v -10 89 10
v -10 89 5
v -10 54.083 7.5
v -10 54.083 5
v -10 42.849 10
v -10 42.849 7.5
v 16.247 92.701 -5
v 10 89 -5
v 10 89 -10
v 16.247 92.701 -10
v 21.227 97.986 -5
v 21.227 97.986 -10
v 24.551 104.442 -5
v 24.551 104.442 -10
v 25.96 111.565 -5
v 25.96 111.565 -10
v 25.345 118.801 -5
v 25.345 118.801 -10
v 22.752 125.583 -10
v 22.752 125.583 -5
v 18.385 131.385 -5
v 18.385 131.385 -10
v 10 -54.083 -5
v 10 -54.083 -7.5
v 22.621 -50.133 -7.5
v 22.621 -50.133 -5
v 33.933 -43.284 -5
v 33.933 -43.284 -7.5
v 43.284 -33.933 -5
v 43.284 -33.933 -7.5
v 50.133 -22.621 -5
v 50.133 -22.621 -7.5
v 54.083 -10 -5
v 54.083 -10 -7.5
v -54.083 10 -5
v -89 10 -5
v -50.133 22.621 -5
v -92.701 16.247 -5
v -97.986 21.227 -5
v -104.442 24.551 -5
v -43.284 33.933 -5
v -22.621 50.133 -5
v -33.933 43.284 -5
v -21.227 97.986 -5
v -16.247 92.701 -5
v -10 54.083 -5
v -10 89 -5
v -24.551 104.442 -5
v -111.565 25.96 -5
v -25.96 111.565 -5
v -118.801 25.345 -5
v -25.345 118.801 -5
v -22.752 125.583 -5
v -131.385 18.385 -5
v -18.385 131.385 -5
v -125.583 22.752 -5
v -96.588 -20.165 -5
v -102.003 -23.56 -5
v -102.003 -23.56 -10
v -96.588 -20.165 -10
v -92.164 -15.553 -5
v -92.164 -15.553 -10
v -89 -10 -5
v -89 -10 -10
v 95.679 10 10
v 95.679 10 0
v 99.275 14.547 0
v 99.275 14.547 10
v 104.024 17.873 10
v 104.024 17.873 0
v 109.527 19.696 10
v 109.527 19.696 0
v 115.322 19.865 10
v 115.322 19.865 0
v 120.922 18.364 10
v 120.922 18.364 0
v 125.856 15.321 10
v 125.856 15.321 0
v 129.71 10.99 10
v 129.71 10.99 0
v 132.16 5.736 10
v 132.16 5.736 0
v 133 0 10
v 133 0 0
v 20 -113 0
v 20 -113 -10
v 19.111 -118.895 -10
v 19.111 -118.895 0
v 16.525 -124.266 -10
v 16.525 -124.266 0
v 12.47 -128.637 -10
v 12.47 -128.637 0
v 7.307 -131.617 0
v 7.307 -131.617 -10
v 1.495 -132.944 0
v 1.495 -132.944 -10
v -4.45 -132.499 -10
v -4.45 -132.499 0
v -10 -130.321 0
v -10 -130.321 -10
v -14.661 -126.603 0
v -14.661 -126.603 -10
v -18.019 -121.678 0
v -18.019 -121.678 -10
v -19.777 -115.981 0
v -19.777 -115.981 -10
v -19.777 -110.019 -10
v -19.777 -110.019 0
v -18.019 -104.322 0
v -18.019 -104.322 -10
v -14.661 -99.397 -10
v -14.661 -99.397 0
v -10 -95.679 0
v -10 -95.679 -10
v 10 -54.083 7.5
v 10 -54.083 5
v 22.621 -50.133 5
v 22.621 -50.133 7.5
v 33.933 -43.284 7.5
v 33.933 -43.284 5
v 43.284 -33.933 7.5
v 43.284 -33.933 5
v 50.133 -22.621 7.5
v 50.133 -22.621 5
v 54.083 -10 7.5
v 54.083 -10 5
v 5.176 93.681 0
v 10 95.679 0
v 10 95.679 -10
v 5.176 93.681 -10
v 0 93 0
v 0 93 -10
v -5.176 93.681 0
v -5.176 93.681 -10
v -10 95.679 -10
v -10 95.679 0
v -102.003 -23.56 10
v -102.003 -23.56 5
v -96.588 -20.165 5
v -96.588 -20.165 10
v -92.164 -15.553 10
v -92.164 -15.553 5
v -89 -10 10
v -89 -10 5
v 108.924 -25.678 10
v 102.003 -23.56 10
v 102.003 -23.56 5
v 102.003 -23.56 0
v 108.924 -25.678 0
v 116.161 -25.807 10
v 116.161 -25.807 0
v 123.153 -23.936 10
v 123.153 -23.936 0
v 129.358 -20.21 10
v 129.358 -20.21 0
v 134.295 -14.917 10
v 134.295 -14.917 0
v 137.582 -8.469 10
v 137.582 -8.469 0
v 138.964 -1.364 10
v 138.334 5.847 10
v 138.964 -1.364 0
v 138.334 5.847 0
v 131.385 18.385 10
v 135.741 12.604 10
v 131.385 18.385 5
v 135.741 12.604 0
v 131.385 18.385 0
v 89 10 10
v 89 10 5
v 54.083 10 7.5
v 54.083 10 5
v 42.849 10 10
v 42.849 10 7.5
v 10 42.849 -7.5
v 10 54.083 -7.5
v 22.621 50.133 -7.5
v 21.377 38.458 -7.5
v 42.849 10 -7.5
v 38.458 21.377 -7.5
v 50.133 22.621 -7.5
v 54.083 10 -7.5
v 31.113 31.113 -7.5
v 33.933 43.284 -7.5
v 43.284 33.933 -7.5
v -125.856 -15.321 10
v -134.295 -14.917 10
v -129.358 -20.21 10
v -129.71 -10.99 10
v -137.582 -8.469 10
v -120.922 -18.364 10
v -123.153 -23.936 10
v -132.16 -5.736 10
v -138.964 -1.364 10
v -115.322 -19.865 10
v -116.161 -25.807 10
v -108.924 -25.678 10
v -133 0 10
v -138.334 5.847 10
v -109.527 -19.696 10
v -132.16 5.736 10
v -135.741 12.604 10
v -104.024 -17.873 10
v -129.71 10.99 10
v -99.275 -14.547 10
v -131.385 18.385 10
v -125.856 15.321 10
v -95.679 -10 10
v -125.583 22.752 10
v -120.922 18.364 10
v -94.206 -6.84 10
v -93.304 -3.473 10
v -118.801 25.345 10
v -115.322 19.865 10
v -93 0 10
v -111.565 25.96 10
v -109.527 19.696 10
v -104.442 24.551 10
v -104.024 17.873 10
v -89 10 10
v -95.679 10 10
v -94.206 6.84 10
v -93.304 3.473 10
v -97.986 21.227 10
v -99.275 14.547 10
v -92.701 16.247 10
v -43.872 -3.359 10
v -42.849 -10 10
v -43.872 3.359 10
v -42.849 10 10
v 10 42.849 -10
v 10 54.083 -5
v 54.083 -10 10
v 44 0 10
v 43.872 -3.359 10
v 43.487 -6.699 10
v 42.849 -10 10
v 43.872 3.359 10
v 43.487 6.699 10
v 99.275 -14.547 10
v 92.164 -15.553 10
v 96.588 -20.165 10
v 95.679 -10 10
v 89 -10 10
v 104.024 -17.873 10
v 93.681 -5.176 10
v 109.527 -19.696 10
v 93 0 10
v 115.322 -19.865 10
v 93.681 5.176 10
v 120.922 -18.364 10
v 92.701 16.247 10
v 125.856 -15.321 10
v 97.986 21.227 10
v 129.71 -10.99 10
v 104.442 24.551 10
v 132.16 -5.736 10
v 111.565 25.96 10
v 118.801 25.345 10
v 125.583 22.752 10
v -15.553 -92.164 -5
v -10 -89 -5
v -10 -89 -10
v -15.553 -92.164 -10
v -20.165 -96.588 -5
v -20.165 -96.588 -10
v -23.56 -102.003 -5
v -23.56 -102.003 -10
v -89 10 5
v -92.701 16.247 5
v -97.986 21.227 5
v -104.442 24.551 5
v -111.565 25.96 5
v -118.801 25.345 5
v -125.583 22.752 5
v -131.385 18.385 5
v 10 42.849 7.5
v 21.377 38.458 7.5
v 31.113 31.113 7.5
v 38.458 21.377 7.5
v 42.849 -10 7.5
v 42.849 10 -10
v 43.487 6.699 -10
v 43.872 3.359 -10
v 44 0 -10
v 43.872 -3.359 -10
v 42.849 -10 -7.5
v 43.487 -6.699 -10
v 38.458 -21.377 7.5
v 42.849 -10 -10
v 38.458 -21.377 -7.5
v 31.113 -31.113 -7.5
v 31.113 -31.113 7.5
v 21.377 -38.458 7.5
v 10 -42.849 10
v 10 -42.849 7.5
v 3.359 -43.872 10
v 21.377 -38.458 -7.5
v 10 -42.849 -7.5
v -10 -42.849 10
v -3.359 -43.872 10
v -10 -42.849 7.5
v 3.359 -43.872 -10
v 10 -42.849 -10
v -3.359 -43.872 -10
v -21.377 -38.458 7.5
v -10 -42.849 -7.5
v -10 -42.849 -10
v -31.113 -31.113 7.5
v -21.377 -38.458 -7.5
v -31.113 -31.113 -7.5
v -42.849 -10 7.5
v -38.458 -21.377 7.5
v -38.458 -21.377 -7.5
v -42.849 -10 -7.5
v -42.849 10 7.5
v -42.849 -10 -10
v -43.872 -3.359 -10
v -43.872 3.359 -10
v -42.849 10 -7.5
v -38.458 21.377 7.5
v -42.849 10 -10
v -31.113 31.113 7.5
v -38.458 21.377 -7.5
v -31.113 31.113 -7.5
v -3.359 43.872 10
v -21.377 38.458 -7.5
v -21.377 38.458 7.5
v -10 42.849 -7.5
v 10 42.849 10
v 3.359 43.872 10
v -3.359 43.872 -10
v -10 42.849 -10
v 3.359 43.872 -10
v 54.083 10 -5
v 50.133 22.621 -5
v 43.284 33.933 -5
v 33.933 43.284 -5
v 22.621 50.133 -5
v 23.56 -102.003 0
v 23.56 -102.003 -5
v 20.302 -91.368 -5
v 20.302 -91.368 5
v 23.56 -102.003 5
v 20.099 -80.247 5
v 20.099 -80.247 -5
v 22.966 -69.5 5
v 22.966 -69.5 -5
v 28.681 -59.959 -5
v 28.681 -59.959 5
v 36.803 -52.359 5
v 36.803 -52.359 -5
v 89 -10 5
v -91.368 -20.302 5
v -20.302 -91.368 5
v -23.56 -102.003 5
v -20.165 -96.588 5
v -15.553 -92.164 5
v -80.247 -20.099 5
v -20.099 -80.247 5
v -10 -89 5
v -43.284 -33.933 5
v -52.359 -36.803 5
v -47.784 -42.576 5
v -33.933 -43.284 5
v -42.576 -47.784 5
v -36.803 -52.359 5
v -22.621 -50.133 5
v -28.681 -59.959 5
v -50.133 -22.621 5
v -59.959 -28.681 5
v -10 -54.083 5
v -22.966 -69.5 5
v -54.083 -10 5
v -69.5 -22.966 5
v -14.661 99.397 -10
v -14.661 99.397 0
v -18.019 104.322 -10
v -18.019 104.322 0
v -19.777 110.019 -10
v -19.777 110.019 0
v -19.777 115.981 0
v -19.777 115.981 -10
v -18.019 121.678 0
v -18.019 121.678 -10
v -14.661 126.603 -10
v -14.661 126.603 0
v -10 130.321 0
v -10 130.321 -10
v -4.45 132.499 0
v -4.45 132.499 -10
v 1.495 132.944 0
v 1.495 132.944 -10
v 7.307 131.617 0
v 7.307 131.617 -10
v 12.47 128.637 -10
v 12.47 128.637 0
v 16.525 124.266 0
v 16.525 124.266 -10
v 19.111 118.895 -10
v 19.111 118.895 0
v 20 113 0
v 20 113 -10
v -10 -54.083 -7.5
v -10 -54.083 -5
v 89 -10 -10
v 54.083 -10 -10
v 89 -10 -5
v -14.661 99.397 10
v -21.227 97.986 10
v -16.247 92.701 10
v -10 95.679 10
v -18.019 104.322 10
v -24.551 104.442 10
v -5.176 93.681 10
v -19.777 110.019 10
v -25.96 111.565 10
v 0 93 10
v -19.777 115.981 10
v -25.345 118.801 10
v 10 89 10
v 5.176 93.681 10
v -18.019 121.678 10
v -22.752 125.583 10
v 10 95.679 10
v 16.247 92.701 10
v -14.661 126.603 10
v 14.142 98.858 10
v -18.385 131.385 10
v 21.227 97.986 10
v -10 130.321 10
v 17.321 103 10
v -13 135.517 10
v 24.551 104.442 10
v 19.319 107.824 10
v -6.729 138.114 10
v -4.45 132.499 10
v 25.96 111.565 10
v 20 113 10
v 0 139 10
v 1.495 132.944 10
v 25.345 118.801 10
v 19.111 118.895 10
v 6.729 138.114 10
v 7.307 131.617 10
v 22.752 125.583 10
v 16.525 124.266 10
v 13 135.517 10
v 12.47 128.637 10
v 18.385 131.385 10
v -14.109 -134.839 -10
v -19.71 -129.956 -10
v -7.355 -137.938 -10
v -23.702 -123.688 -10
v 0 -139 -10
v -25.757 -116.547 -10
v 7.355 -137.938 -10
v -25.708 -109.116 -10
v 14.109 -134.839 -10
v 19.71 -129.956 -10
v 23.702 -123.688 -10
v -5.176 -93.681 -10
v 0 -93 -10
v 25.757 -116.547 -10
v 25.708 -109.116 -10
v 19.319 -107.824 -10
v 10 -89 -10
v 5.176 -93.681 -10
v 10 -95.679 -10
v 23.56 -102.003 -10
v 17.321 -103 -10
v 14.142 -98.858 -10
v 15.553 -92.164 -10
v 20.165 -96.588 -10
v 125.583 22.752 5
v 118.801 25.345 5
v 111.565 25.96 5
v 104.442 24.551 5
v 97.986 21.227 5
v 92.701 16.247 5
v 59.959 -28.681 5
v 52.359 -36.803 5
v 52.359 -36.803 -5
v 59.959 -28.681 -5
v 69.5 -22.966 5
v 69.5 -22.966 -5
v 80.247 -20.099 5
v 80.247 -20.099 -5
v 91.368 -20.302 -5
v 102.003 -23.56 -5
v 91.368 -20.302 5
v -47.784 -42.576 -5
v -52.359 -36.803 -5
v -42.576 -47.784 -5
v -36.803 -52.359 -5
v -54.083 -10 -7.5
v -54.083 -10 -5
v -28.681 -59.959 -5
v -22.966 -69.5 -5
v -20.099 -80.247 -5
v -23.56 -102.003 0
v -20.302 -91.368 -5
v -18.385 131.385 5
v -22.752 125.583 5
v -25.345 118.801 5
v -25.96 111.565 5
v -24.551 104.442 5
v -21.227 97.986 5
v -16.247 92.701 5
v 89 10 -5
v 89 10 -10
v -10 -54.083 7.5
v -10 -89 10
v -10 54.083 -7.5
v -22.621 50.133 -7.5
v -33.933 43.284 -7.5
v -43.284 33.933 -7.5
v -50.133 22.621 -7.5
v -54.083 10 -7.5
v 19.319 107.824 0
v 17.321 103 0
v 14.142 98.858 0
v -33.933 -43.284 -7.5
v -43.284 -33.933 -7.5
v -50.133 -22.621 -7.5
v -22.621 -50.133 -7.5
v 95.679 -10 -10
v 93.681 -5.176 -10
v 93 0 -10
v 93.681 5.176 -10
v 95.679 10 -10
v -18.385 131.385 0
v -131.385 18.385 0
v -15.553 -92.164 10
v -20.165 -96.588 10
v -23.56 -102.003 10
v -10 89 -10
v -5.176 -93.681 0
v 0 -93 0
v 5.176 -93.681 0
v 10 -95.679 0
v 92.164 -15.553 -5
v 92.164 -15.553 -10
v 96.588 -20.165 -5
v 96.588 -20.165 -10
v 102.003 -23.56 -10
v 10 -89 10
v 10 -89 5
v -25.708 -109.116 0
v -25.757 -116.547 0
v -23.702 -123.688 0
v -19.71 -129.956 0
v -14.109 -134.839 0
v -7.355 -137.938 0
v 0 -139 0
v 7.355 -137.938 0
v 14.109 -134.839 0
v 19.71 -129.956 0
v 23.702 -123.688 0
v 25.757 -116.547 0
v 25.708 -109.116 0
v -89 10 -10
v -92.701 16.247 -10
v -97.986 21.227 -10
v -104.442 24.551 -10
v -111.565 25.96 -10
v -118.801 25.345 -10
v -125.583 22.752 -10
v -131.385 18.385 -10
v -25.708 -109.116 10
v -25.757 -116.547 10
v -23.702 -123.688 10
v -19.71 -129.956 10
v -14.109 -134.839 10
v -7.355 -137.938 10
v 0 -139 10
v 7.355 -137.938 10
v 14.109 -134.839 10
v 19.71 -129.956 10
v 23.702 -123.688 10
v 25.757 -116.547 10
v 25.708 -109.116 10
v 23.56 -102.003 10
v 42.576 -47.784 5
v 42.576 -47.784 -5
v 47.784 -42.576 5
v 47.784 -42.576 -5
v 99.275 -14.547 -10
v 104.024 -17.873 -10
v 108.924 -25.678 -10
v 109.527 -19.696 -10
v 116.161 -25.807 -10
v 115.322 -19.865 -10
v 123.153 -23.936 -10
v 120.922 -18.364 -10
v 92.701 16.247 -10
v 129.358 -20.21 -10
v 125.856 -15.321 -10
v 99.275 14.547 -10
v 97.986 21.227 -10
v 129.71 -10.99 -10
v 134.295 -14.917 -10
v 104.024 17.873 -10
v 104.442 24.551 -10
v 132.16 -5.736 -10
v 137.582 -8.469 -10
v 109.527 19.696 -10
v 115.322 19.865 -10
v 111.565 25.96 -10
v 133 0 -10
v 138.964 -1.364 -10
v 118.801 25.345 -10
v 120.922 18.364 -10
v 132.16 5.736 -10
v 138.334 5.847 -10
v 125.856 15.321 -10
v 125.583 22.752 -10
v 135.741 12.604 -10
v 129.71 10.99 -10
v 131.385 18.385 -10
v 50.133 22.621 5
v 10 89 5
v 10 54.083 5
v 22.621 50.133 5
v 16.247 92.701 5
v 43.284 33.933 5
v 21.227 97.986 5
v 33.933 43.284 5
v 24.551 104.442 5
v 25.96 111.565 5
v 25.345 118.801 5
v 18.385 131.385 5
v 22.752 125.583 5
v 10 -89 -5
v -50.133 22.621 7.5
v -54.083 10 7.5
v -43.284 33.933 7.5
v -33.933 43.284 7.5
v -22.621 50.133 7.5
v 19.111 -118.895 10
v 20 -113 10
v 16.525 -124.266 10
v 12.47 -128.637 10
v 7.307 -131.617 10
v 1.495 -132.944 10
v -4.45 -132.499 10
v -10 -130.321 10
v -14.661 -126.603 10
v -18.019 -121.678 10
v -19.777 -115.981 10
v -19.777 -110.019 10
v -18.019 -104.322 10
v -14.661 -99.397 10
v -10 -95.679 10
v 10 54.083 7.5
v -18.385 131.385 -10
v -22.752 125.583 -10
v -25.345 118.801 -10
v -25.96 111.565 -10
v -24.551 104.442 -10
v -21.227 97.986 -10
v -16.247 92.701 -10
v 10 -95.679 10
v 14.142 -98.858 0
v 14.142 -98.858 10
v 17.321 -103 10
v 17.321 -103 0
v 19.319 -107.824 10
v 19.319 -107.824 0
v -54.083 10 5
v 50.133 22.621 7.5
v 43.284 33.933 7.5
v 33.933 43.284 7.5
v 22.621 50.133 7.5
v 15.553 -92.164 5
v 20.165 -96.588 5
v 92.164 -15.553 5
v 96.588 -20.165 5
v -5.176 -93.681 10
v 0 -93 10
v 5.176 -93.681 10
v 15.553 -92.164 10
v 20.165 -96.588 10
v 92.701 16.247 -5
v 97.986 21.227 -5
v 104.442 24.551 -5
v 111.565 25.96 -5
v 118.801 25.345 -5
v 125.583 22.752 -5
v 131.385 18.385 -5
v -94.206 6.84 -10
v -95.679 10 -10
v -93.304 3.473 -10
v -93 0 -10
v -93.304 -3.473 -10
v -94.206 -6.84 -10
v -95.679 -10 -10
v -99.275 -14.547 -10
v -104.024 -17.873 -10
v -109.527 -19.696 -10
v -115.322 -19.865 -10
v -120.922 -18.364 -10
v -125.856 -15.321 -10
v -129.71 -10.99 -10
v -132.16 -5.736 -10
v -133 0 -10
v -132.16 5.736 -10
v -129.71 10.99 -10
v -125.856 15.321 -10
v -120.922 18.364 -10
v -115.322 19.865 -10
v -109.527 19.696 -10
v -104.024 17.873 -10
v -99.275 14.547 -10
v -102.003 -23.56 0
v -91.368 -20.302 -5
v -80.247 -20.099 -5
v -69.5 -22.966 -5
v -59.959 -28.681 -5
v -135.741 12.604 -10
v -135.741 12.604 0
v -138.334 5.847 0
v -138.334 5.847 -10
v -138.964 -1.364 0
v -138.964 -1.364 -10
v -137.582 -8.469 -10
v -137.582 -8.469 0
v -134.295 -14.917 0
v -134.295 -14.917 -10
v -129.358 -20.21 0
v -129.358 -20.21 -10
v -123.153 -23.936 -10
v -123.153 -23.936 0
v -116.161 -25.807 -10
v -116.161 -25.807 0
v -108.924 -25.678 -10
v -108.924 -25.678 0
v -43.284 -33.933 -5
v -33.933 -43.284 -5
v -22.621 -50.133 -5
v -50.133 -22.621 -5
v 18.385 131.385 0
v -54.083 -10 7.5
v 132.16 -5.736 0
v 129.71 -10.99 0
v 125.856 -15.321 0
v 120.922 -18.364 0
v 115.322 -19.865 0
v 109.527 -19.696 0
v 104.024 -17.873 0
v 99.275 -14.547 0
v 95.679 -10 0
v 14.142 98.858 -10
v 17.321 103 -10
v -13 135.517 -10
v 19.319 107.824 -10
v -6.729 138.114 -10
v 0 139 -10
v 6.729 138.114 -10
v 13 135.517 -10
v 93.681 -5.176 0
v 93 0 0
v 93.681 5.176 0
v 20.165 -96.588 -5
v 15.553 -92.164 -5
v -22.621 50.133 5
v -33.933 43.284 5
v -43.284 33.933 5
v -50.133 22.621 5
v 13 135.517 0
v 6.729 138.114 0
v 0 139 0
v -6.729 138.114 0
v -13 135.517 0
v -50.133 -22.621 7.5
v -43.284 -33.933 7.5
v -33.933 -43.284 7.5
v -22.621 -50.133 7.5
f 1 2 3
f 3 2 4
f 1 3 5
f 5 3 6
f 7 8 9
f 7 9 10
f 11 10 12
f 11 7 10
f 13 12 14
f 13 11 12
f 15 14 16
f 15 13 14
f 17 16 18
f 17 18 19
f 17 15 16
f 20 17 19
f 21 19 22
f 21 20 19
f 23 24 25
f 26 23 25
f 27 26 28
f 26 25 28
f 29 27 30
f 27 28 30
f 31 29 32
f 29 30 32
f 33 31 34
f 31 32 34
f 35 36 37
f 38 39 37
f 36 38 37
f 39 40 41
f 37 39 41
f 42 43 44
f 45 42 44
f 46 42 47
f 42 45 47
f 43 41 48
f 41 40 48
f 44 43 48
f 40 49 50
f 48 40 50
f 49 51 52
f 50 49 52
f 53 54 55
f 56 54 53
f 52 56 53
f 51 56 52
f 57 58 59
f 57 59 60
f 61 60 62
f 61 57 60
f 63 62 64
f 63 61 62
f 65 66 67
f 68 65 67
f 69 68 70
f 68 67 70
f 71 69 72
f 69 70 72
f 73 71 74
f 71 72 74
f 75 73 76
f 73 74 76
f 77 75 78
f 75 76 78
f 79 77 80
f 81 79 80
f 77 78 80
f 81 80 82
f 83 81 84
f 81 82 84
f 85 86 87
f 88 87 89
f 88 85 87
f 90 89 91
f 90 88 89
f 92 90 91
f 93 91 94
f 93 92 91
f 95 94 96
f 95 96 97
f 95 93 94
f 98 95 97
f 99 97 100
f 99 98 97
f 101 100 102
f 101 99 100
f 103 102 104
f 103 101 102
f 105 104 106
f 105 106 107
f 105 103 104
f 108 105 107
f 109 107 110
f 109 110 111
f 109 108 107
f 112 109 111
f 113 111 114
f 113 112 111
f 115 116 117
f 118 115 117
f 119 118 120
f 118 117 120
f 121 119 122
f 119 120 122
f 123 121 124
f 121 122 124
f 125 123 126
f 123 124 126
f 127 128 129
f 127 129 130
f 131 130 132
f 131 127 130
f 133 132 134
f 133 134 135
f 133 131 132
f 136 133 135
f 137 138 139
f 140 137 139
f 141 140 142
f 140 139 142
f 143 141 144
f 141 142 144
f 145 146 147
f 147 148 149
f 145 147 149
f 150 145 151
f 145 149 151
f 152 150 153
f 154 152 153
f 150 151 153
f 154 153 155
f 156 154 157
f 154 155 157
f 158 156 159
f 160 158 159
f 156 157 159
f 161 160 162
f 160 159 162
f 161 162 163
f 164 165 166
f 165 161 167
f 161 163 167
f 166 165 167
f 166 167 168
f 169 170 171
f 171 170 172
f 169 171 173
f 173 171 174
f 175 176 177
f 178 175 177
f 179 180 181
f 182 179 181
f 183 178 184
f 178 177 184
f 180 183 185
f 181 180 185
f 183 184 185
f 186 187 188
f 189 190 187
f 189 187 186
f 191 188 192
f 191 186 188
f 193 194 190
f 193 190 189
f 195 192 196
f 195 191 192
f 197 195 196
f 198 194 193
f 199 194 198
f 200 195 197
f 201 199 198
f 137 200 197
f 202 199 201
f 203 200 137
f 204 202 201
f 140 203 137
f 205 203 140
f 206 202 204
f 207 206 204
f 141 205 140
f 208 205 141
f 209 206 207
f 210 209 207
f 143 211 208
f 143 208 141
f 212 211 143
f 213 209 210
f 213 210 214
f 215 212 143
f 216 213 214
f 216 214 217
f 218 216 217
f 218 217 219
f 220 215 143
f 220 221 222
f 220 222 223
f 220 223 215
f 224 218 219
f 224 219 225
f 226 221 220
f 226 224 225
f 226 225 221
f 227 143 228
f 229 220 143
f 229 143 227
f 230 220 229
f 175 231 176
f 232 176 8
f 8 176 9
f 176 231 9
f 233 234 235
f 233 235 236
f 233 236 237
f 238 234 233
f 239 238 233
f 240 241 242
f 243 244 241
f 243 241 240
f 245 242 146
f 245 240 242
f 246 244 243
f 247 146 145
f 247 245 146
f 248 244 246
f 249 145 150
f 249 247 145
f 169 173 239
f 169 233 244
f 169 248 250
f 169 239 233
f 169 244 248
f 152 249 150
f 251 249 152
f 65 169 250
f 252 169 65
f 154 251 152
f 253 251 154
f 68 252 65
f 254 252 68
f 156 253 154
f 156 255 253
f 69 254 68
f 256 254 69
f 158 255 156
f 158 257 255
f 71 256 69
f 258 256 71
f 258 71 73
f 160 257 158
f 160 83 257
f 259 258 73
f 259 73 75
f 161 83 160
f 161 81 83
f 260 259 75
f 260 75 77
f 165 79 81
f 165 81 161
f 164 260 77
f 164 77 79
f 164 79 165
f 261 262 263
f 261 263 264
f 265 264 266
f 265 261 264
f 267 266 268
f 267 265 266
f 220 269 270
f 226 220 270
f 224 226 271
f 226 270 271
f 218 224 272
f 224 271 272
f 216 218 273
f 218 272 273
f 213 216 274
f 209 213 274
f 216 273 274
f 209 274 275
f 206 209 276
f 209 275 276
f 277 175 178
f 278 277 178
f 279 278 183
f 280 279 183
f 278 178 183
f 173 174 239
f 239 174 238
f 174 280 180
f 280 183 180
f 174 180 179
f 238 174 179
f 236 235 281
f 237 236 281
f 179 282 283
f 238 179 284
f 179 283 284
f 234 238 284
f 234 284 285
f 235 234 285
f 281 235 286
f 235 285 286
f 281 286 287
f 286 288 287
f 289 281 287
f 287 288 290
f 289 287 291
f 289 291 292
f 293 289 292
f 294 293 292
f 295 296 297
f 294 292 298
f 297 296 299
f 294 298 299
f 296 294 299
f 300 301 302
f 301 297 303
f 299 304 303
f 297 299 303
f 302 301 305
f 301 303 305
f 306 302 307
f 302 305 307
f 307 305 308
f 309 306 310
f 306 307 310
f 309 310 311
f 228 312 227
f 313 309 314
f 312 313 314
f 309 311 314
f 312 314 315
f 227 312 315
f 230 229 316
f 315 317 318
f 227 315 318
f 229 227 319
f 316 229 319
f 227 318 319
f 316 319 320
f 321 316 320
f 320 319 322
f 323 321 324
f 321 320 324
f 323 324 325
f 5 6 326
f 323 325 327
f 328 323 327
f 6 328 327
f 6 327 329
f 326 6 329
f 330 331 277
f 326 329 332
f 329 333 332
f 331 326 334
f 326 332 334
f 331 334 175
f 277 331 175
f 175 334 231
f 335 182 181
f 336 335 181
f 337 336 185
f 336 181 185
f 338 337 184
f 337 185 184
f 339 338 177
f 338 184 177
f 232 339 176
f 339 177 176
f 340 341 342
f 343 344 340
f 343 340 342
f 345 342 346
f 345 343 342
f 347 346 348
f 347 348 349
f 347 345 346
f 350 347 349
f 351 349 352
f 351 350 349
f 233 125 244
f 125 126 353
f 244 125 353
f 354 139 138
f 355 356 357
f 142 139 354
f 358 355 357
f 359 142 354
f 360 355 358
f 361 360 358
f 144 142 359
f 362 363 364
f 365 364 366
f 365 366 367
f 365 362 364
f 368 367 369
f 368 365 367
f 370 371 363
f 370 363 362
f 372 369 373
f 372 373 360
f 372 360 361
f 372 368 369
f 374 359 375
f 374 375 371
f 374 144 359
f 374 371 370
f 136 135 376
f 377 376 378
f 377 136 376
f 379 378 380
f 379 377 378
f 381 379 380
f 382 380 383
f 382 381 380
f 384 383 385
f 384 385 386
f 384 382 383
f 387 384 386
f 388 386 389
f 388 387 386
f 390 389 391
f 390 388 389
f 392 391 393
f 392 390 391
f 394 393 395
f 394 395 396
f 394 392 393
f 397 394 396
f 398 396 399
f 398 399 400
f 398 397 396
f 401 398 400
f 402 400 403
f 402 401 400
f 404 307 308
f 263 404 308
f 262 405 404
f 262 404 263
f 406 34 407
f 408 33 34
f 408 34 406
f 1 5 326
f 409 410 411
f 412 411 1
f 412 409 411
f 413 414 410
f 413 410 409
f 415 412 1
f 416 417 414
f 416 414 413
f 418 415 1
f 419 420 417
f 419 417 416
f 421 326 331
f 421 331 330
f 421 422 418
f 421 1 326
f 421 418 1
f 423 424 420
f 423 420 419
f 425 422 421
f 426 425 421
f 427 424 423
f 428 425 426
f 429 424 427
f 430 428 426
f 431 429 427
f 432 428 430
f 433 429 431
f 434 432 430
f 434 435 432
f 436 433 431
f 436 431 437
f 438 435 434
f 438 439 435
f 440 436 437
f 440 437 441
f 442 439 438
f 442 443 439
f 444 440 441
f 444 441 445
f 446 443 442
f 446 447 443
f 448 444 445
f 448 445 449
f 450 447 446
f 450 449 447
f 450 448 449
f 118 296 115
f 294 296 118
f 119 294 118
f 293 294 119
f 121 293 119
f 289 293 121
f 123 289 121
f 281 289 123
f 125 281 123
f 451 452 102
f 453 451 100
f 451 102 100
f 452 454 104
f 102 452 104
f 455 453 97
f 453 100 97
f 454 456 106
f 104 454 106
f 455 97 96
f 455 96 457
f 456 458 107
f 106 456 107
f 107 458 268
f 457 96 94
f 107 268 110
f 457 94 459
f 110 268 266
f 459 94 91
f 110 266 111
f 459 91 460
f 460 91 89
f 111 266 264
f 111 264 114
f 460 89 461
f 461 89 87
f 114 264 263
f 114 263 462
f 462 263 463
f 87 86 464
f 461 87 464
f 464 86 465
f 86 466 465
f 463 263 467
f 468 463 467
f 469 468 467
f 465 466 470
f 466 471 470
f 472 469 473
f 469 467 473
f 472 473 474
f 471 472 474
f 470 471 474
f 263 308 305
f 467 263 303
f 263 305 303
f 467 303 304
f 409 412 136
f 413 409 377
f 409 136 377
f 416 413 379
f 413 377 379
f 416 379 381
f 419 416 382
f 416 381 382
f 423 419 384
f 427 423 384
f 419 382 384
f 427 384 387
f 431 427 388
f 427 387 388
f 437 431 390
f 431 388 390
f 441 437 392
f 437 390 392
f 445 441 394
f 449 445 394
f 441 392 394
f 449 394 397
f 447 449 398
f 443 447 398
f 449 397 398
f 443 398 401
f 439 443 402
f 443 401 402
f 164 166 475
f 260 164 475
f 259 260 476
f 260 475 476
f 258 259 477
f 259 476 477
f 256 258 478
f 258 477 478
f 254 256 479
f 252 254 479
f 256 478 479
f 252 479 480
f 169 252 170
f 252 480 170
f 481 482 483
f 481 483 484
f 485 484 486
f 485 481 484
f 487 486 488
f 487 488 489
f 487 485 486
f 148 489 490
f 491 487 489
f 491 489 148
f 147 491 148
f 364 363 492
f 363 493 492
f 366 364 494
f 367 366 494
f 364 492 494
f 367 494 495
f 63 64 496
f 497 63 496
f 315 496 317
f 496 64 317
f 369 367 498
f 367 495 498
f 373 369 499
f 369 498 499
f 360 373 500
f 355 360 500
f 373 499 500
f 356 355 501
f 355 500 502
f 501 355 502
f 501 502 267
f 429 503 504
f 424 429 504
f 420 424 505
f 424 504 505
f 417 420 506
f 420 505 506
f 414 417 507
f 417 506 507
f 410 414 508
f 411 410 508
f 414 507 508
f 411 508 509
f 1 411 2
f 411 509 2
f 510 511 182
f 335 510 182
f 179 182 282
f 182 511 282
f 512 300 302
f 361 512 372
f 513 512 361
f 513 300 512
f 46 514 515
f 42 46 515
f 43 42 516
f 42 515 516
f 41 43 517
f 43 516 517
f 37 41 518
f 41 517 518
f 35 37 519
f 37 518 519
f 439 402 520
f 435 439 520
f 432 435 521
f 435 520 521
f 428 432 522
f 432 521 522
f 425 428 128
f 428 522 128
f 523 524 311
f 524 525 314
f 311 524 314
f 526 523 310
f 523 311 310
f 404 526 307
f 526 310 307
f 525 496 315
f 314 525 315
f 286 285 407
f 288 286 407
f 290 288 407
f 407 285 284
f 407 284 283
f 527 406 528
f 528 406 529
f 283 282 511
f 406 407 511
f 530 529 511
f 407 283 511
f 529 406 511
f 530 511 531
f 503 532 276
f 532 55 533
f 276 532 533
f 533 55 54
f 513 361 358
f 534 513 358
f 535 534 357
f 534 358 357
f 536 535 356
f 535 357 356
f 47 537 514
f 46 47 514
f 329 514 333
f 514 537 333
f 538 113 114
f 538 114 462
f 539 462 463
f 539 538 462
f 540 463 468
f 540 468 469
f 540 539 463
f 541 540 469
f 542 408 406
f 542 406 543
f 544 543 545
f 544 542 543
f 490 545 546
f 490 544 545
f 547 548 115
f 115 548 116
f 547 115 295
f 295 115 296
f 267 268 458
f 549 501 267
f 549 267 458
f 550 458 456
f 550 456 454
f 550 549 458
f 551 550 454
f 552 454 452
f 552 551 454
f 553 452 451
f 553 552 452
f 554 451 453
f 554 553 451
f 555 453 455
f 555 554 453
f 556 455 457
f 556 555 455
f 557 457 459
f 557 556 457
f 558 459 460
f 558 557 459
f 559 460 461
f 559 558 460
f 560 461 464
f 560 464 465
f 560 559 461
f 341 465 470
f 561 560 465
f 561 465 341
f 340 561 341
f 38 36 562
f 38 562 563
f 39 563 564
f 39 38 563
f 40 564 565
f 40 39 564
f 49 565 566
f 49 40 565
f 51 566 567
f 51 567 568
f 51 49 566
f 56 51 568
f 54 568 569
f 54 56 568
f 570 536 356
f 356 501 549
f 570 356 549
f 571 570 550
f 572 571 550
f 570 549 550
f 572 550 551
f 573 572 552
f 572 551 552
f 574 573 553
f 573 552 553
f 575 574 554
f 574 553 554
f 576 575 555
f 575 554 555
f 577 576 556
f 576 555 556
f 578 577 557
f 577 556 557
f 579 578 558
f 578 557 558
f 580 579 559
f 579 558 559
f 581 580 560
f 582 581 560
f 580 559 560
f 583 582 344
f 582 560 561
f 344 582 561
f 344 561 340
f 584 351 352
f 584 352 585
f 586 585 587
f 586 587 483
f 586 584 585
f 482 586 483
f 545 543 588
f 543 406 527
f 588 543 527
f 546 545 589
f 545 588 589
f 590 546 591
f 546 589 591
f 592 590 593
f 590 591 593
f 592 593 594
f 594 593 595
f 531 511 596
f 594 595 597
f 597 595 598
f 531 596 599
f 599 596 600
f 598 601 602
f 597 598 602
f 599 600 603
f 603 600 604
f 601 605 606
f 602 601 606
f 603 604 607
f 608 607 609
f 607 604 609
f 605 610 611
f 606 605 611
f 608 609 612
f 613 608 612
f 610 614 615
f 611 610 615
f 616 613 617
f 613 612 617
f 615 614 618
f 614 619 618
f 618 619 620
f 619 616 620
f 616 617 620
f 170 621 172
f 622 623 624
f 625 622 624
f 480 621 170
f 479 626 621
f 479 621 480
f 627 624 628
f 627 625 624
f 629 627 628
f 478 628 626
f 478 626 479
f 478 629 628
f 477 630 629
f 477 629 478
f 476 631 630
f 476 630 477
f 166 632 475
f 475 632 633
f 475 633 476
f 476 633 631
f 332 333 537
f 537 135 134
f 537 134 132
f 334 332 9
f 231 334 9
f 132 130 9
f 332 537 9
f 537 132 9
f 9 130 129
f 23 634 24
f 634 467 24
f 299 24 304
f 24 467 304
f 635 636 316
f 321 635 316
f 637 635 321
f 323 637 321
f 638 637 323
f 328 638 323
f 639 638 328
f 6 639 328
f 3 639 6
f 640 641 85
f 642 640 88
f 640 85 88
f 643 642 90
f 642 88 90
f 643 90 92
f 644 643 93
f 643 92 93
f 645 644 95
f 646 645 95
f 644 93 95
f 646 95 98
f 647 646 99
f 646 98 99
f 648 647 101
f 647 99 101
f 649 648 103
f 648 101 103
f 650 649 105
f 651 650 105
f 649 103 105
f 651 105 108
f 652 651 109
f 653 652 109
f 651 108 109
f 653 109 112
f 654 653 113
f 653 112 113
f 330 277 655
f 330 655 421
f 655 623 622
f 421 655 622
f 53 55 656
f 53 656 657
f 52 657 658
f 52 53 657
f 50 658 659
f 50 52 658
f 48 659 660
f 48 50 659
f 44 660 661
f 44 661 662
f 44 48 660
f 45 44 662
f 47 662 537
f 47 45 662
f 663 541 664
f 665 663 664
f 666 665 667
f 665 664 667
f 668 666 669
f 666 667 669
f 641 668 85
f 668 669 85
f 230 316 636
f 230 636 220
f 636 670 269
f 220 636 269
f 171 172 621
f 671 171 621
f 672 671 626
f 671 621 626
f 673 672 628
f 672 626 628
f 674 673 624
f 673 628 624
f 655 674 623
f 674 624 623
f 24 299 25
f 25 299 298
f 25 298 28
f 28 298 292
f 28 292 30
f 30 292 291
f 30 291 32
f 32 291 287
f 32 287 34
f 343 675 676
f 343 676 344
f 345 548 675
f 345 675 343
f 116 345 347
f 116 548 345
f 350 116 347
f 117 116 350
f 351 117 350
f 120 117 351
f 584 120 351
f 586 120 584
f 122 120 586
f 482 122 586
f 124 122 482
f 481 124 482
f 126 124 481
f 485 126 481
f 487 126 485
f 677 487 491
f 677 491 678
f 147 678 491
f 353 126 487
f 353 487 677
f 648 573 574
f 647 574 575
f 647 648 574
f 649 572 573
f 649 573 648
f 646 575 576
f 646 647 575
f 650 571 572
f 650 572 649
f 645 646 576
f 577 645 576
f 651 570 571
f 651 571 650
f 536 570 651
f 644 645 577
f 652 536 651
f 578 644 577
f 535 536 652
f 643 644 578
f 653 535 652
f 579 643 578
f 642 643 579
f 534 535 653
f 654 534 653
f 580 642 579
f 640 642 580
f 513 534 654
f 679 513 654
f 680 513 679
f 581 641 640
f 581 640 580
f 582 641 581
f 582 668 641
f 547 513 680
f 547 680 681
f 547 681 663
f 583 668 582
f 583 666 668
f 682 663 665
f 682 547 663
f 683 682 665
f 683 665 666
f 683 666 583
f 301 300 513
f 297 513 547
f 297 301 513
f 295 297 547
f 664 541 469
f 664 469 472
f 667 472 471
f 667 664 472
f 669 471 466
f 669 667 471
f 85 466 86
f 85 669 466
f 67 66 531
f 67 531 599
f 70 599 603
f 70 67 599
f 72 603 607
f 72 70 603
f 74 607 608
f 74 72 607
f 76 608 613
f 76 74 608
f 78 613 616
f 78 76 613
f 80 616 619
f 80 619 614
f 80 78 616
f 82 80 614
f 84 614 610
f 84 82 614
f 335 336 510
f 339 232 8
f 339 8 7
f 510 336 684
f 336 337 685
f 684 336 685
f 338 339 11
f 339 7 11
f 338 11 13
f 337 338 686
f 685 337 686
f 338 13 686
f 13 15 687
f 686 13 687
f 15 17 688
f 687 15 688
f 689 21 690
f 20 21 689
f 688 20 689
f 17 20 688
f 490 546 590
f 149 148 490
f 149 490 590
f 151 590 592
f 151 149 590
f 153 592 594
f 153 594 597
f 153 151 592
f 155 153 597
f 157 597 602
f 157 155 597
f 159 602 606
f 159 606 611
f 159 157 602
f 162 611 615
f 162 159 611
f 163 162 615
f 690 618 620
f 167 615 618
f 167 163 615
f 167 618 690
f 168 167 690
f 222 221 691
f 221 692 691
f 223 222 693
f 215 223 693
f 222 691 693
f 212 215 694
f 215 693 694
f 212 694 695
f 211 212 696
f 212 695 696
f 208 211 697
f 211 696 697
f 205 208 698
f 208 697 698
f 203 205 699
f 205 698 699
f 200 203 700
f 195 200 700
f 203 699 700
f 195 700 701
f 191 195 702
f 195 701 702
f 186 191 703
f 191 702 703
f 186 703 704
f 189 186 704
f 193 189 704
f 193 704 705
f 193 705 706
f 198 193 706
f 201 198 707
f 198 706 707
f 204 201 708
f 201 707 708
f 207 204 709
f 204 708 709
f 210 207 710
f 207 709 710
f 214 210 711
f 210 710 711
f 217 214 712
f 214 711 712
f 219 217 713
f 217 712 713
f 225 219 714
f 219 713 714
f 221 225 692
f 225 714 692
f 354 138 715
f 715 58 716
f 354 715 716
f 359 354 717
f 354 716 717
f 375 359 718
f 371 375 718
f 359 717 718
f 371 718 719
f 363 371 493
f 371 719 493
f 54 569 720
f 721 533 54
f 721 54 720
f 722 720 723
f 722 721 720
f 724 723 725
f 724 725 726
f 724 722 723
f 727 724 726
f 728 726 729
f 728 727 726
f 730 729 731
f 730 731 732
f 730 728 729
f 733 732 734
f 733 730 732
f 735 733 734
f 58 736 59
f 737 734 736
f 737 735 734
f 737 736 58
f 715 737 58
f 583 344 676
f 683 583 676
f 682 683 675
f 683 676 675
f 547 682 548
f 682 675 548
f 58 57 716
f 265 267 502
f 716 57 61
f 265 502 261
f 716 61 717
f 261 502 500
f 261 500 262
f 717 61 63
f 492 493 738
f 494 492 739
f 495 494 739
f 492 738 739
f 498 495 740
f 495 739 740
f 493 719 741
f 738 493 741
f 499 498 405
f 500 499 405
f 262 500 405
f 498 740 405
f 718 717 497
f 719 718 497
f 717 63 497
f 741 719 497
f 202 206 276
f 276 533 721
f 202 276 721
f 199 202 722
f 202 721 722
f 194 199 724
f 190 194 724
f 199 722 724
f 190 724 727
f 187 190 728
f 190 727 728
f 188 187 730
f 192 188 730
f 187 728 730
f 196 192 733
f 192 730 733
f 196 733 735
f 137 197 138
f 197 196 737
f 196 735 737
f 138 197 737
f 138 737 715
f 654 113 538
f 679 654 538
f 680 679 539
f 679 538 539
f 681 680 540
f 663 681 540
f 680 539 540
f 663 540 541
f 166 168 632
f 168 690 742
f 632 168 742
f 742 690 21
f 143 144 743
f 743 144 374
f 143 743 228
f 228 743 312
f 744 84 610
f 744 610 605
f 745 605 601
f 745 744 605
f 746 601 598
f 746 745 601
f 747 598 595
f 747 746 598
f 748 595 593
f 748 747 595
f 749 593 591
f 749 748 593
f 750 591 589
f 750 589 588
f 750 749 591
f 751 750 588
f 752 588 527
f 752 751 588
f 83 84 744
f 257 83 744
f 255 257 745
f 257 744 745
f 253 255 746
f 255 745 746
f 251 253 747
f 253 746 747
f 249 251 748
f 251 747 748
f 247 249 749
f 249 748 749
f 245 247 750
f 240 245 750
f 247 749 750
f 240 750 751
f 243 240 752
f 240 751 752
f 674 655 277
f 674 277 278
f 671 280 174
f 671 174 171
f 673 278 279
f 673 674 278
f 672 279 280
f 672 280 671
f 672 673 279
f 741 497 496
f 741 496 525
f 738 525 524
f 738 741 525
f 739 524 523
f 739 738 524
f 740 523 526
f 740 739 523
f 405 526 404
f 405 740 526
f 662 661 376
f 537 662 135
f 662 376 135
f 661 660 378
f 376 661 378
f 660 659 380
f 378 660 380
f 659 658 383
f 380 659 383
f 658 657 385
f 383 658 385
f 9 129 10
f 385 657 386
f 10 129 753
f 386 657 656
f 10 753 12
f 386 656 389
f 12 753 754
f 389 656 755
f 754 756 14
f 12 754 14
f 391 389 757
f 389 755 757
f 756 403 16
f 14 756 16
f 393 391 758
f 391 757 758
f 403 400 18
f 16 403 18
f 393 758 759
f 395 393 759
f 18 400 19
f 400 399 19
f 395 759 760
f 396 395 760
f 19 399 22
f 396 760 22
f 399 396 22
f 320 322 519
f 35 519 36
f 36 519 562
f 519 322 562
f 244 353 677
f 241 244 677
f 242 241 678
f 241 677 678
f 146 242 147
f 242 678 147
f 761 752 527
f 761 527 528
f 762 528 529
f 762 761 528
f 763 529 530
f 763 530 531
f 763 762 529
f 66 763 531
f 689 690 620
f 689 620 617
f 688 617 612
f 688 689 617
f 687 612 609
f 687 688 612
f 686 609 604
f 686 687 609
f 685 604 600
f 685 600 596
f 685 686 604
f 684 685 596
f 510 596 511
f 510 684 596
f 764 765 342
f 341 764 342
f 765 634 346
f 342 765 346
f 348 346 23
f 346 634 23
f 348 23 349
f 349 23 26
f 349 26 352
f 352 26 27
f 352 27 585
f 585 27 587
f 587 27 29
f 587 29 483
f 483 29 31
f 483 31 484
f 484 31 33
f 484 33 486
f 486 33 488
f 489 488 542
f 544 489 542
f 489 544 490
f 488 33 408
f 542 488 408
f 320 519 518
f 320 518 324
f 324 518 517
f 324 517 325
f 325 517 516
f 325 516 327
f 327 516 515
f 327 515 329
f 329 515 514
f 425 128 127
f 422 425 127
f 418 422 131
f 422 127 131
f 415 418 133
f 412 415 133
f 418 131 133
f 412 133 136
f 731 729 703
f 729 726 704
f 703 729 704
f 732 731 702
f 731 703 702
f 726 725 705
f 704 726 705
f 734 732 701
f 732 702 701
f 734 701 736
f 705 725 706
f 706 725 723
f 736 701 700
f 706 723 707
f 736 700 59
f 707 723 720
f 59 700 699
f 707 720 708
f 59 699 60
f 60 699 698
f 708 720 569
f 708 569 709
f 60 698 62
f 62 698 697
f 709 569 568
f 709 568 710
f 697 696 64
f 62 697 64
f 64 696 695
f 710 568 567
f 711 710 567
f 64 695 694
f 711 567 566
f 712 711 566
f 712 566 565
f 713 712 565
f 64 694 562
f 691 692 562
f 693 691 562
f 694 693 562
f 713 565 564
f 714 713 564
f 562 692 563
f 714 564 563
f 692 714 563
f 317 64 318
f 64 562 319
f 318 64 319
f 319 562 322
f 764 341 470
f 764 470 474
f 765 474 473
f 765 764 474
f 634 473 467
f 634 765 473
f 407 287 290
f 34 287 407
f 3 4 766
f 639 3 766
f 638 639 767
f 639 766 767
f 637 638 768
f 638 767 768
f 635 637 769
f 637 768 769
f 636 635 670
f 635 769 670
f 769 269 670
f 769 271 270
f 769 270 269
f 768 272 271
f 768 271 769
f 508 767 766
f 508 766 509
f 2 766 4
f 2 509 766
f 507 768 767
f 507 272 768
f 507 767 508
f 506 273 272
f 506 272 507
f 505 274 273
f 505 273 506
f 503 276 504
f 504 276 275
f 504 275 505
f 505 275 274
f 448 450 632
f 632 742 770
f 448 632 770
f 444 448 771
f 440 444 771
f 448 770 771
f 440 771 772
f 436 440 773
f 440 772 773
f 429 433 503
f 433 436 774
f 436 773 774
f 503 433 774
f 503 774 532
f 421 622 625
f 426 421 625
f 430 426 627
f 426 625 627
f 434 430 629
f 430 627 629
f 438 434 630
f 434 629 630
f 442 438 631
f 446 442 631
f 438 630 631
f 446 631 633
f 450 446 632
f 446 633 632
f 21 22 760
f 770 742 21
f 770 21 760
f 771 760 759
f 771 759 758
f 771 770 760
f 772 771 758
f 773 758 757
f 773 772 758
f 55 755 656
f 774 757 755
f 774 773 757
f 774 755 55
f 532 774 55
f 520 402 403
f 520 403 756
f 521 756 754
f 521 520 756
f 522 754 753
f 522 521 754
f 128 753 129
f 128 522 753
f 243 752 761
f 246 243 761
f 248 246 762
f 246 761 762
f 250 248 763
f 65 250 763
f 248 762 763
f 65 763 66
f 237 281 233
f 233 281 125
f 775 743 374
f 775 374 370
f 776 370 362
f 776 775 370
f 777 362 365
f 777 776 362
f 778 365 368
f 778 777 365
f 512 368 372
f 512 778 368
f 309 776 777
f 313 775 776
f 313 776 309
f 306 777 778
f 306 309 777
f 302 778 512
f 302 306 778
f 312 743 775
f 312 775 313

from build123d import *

# Parameters (mm, degrees)
SKETCH1_R             = 20
BOSS_EXTRUDE1_DEPTH   = 10
BOSS_EXTRUDE1_2_DEPTH = 10
BOSS_EXTRUDE1_3_DEPTH = 10
BOSS_EXTRUDE1_4_DEPTH = 10
BOSS_EXTRUDE2_DEPTH   = 7.5
BOSS_EXTRUDE3_DEPTH   = 5


with BuildPart() as part:
    # Sketch1 → Boss-Extrude1 (new, symmetric)
    with BuildSketch(Plane.XY):
        with BuildLine():
            ThreePointArc((-42.848570571, -10), (-44, 0), (-42.848570571, 10))
            Line((-42.848570571, 10), (-89, 10))
            ThreePointArc((-89, 10), (-139, 0), (-89, -10))
            Line((-89, -10), (-42.848570571, -10))
        make_face()
        with Locations((-113, 0)):
            Circle(SKETCH1_R, mode=Mode.SUBTRACT)
    extrude(amount=BOSS_EXTRUDE1_DEPTH, both=True)



with BuildPart() as body_2:
    # Sketch1 → Boss-Extrude1 2 (new, symmetric)
    with BuildSketch(Plane.XY):
        with BuildLine():
            ThreePointArc((-10, 42.848570571), (0, 44), (10, 42.848570571))
            Line((10, 42.848570571), (10, 89))
            ThreePointArc((10, 89), (0, 139), (-10, 89))
            Line((-10, 89), (-10, 42.848570571))
        make_face()
        with Locations((0, 113)):
            Circle(SKETCH1_R, mode=Mode.SUBTRACT)
    extrude(amount=BOSS_EXTRUDE1_2_DEPTH, both=True)


with BuildPart() as body_3:
    # Sketch1 → Boss-Extrude1 3 (new, symmetric)
    with BuildSketch(Plane.XY):
        with BuildLine():
            ThreePointArc((10, -42.848570571), (0, -44), (-10, -42.848570571))
            Line((-10, -42.848570571), (-10, -89))
            ThreePointArc((-10, -89), (0, -139), (10, -89))
            Line((10, -89), (10, -42.848570571))
        make_face()
        with Locations((0, -113)):
            Circle(SKETCH1_R, mode=Mode.SUBTRACT)
    extrude(amount=BOSS_EXTRUDE1_3_DEPTH, both=True)


with BuildPart() as body_4:
    # Sketch1 → Boss-Extrude1 4 (new, symmetric)
    with BuildSketch(Plane.XY):
        with BuildLine():
            ThreePointArc((42.848570571, 10), (44, 0), (42.848570571, -10))
            Line((42.848570571, -10), (89, -10))
            ThreePointArc((89, -10), (139, 0), (89, 10))
            Line((89, 10), (42.848570571, 10))
        make_face()
        with Locations((113, 0)):
            Circle(SKETCH1_R, mode=Mode.SUBTRACT)
    extrude(amount=BOSS_EXTRUDE1_4_DEPTH, both=True)


with BuildPart() as part_1:
    add(part.part)

    add(body_2.part)  # Boss-Extrude2 merges body 2

    add(body_3.part)  # Boss-Extrude2 merges body 3

    add(body_4.part)  # Boss-Extrude2 merges body 4
    # Sketch1<3> → Boss-Extrude2 (add, symmetric)
    with BuildSketch(Plane.XY):
        with BuildLine():
            Line((-54.083269132, 10), (-42.848570571, 10))
            ThreePointArc((-42.848570571, 10), (-31.112698372, 31.112698372), (-10, 42.848570571))
            Line((-10, 42.848570571), (-10, 54.083269132))
            ThreePointArc((-10, 54.083269132), (-38.890872965, 38.890872965), (-54.083269132, 10))
        make_face()
        with BuildLine():
            ThreePointArc((-10, -42.848570571), (-31.112698372, -31.112698372), (-42.848570571, -10))
            Line((-42.848570571, -10), (-54.083269132, -10))
            ThreePointArc((-54.083269132, -10), (-38.890872965, -38.890872965), (-10, -54.083269132))
            Line((-10, -54.083269132), (-10, -42.848570571))
        make_face()
        with BuildLine():
            Line((10, 54.083269132), (10, 42.848570571))
            ThreePointArc((10, 42.848570571), (31.112698372, 31.112698372), (42.848570571, 10))
            Line((42.848570571, 10), (54.083269132, 10))
            ThreePointArc((54.083269132, 10), (38.890872965, 38.890872965), (10, 54.083269132))
        make_face()
        with BuildLine():
            ThreePointArc((42.848570571, -10), (31.112698372, -31.112698372), (10, -42.848570571))
            Line((10, -42.848570571), (10, -54.083269132))
            ThreePointArc((10, -54.083269132), (38.890872965, -38.890872965), (54.083269132, -10))
            Line((54.083269132, -10), (42.848570571, -10))
        make_face()
    extrude(amount=BOSS_EXTRUDE2_DEPTH, both=True)

    # Sketch1<4> → Boss-Extrude3 (add, symmetric)
    with BuildSketch(Plane.XY):
        with BuildLine():
            Line((-89, 10), (-54.083269132, 10))
            ThreePointArc((-54.083269132, 10), (-38.890872965, 38.890872965), (-10, 54.083269132))
            Line((-10, 54.083269132), (-10, 89))
            ThreePointArc((-10, 89), (-25.505709112, 107.954328319), (-18.384776311, 131.384776311))
            Line((-18.384776311, 131.384776311), (-131.384776311, 18.384776311))
            ThreePointArc((-131.384776311, 18.384776311), (-107.954328319, 25.505709112), (-89, 10))
        make_face()
        with BuildLine():
            ThreePointArc((-10, -54.083269132), (-38.890872965, -38.890872965), (-54.083269132, -10))
            Line((-54.083269132, -10), (-89, -10))
            ThreePointArc((-89, -10), (-94.233874983, -17.995348061), (-102.002815768, -23.559752524))
            ThreePointArc((-102.002815768, -23.559752524), (-74.773631801, -21.15717706), (-52.359428182, -36.803400392))
            ThreePointArc((-52.359428182, -36.803400392), (-45.254833996, -45.254833996), (-36.803400392, -52.359428182))
            ThreePointArc((-36.803400392, -52.359428182), (-21.15717706, -74.773631801), (-23.559752524, -102.002815768))
            ThreePointArc((-23.559752524, -102.002815768), (-17.995348061, -94.233874983), (-10, -89))
            Line((-10, -89), (-10, -54.083269132))
        make_face()
        with BuildLine():
            Line((10, 89), (10, 54.083269132))
            ThreePointArc((10, 54.083269132), (38.890872965, 38.890872965), (54.083269132, 10))
            Line((54.083269132, 10), (89, 10))
            ThreePointArc((89, 10), (107.954328319, 25.505709112), (131.384776311, 18.384776311))
            Line((131.384776311, 18.384776311), (18.384776311, 131.384776311))
            ThreePointArc((18.384776311, 131.384776311), (25.505709112, 107.954328319), (10, 89))
        make_face()
        with BuildLine():
            ThreePointArc((54.083269132, -10), (38.890872965, -38.890872965), (10, -54.083269132))
            Line((10, -54.083269132), (10, -89))
            ThreePointArc((10, -89), (17.995348061, -94.233874983), (23.559752524, -102.002815768))
            ThreePointArc((23.559752524, -102.002815768), (21.15717706, -74.773631801), (36.803400392, -52.359428182))
            ThreePointArc((36.803400392, -52.359428182), (45.254833996, -45.254833996), (52.359428182, -36.803400392))
            ThreePointArc((52.359428182, -36.803400392), (74.773631801, -21.15717706), (102.002815768, -23.559752524))
            ThreePointArc((102.002815768, -23.559752524), (94.233874983, -17.995348061), (89, -10))
            Line((89, -10), (54.083269132, -10))
        make_face()
    extrude(amount=BOSS_EXTRUDE3_DEPTH, both=True)


solid = part_1.part
